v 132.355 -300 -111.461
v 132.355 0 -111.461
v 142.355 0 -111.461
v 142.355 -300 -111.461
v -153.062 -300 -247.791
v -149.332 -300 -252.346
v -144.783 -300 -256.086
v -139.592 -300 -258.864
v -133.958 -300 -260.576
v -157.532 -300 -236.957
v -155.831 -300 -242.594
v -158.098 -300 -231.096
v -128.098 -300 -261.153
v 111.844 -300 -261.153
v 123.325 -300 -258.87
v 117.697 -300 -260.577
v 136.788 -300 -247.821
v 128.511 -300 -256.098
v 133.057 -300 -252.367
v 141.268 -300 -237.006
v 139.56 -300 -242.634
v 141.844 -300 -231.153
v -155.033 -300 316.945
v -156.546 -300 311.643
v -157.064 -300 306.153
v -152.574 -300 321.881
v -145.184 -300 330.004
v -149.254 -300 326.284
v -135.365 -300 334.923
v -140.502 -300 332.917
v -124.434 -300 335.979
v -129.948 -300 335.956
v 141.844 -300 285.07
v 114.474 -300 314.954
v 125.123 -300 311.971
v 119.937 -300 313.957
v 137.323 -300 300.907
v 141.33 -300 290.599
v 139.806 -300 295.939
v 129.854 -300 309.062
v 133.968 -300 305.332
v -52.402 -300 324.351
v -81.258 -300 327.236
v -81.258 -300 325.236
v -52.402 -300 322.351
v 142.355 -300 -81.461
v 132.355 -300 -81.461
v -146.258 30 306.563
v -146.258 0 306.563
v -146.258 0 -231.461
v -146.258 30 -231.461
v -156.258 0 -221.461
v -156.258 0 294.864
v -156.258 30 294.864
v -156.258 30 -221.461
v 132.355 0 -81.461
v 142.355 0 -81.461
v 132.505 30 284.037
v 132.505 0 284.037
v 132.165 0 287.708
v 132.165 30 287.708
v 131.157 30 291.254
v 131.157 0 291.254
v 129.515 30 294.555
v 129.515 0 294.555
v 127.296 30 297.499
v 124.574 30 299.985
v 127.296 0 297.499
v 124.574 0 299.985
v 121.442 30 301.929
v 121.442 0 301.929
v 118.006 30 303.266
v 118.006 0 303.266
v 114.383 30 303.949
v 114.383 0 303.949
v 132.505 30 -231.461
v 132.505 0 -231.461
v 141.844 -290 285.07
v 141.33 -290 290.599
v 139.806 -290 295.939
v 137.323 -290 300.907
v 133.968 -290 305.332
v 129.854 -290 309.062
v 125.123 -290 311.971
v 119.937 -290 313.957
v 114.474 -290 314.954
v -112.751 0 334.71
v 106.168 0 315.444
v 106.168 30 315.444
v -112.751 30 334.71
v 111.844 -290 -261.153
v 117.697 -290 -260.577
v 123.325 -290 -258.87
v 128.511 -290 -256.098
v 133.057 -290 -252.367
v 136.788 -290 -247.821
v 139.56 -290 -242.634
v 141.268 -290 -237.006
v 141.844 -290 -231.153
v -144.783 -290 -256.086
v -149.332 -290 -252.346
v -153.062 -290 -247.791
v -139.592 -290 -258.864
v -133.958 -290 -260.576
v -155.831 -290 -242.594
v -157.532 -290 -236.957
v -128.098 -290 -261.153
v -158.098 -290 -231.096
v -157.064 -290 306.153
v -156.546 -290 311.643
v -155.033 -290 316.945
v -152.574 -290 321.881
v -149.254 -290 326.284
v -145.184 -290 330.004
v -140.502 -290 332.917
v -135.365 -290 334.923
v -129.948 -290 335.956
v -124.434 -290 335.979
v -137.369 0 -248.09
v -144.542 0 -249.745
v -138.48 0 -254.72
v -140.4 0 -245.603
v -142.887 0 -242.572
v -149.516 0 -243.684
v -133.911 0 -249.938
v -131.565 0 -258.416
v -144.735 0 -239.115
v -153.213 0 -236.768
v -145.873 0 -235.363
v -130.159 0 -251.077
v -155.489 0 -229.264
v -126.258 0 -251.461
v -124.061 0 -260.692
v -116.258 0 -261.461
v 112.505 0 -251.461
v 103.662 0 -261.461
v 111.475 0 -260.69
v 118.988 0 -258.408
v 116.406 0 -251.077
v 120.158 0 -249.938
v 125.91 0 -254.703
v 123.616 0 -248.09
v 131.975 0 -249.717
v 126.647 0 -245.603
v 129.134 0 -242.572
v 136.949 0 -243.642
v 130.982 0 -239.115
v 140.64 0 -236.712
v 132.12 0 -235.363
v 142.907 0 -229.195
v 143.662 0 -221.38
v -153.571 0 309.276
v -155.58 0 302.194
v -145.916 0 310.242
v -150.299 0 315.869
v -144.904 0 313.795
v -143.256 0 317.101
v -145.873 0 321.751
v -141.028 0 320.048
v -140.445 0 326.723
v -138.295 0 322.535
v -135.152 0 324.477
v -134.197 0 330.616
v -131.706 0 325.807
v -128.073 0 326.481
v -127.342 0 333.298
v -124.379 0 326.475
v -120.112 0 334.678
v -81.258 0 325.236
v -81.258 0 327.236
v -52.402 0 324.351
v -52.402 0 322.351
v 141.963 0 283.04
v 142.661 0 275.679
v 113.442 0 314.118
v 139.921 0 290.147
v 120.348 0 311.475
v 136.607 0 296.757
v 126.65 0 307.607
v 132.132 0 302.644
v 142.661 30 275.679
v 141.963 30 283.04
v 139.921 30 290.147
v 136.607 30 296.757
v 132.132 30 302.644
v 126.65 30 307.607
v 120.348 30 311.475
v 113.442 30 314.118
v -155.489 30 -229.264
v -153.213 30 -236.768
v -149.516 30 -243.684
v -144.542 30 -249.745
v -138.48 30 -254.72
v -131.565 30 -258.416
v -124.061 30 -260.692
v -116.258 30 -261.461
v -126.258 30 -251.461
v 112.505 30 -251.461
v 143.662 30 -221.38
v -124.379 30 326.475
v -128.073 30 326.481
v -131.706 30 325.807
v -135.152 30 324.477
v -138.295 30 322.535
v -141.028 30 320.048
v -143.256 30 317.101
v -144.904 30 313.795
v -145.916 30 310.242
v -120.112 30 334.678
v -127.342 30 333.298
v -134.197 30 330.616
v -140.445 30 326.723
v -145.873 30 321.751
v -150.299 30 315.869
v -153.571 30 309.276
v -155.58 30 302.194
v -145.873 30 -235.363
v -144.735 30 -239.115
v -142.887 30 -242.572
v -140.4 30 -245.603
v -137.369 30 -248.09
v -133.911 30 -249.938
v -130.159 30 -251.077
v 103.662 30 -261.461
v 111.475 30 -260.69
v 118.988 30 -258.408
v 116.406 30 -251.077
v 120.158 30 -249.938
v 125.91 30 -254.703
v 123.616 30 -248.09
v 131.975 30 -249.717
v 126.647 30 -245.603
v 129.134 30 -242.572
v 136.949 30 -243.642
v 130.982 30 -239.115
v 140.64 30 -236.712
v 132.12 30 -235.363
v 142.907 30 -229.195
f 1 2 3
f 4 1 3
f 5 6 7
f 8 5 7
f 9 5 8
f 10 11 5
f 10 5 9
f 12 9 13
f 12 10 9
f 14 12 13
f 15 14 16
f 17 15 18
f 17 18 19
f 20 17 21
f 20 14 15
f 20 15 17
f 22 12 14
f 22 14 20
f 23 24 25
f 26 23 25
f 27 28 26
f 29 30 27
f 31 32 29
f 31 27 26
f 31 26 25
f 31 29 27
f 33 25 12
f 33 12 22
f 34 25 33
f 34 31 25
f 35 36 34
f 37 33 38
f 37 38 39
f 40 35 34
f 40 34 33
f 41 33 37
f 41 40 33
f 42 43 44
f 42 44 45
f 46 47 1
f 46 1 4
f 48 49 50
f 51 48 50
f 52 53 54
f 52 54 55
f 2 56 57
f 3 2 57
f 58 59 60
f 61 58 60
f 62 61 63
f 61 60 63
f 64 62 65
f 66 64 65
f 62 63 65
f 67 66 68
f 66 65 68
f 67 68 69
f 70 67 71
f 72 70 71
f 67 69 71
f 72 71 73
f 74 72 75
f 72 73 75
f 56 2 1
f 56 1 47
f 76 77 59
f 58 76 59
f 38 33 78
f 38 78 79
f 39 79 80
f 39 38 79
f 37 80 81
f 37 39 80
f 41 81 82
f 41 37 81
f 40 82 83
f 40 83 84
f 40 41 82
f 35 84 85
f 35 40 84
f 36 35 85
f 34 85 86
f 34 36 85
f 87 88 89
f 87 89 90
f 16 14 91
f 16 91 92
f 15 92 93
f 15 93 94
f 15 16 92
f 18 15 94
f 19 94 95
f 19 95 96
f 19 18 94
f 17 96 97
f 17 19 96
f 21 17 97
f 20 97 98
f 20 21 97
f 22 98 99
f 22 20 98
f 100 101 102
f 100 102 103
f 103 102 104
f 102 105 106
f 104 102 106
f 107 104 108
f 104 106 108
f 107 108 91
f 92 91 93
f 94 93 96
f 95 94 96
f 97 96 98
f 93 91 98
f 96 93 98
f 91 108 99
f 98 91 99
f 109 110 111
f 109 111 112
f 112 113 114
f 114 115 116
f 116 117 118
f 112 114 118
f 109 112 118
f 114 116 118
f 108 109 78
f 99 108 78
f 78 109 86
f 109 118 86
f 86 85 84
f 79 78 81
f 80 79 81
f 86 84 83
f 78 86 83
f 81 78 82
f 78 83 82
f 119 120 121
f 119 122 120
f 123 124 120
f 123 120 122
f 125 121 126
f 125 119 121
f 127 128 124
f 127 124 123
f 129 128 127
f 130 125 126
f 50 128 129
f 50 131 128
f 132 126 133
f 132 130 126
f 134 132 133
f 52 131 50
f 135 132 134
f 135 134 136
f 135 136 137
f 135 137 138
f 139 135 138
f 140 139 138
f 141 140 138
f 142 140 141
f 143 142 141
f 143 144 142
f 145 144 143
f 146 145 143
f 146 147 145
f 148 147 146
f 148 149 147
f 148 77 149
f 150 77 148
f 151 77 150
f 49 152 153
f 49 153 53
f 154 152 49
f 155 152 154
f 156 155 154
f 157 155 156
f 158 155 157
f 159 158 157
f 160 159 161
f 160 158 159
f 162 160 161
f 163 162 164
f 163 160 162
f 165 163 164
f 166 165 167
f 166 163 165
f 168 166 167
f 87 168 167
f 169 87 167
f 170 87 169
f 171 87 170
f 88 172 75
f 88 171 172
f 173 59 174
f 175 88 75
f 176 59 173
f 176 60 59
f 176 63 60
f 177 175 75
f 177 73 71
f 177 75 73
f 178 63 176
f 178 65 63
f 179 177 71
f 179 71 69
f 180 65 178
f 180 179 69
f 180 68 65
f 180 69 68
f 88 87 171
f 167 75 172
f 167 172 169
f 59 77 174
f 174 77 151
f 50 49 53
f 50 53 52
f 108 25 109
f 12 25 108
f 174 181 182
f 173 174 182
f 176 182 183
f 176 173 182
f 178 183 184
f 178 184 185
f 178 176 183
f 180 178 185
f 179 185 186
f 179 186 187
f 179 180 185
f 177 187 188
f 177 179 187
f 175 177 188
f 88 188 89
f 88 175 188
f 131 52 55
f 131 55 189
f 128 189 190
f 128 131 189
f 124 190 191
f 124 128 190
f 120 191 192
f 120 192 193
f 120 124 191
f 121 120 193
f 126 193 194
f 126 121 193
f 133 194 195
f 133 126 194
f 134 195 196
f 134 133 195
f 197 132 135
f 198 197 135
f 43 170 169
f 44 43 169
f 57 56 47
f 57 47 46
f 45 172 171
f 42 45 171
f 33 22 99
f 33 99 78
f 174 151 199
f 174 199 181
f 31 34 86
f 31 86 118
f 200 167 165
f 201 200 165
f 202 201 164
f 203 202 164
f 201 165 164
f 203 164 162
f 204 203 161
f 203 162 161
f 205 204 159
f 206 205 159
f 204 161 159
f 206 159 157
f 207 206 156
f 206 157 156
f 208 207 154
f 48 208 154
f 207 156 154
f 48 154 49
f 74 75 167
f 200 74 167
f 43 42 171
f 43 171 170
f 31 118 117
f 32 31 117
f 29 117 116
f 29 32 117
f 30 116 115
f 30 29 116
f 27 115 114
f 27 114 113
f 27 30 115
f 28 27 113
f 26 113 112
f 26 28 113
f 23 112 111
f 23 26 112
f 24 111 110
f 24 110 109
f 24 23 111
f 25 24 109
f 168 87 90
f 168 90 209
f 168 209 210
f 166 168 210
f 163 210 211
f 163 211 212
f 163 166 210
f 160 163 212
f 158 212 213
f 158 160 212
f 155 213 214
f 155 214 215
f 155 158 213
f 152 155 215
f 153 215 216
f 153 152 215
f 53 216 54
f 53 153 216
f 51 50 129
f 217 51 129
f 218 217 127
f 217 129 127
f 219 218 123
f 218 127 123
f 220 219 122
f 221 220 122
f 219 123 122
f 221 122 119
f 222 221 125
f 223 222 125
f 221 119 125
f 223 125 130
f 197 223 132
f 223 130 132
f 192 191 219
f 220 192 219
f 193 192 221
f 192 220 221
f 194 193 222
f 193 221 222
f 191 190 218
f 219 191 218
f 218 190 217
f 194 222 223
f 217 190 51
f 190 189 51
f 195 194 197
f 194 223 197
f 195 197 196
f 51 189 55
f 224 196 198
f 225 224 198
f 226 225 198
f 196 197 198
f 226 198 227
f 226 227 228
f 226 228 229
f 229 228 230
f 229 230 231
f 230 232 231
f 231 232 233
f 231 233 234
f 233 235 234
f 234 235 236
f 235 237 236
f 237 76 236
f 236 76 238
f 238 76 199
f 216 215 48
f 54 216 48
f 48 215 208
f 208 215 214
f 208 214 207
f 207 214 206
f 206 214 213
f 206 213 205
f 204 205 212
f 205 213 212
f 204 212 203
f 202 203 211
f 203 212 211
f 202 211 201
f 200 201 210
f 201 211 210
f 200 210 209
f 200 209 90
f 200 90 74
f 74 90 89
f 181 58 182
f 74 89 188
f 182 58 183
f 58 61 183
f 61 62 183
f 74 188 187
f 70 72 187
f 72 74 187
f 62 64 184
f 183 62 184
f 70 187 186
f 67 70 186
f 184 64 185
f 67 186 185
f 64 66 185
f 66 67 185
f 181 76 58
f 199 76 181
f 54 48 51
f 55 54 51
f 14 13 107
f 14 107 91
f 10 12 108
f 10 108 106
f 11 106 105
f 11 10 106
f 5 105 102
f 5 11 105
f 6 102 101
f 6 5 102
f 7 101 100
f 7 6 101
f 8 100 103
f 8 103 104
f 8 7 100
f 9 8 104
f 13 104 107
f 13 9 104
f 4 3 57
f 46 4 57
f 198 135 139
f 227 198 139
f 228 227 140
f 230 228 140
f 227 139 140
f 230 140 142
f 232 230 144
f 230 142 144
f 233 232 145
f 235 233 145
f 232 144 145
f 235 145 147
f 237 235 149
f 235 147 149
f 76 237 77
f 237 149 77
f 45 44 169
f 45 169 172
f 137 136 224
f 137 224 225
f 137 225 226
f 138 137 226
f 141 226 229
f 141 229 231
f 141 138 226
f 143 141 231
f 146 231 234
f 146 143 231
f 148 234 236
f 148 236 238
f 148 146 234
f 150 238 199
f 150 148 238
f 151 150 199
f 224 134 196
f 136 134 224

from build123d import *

# Parameters (mm, degrees)
F1_DEPTH = 30
F3_DEPTH = 30
F4_W     = 10
F4_H     = 30
F5_DEPTH = 300
F7_DEPTH = 300
F9_DEPTH = 10


with BuildPart() as f1:
    # F0 (on Front) → F1 (new body)
    with BuildSketch(Plane.XZ):
        with BuildLine():
            ThreePointArc((-112.750921, 334.7103), (-143.273633, 324.362328), (-156.257588, 294.864305))
            Line((-156.257588, 294.864305), (-156.257588, -221.460874))
            ThreePointArc((-156.257588, -221.460874), (-144.541859, -249.745146), (-116.257588, -261.460874))
            Line((-116.257588, -261.460874), (103.661798, -261.460874))
            ThreePointArc((103.661798, -261.460874), (131.974528, -249.716659), (143.661717, -221.380342))
            Line((143.661717, -221.380342), (142.660979, 275.678792))
            ThreePointArc((142.660979, 275.678792), (132.131872, 302.643985), (106.167727, 315.444255))
            Line((106.167727, 315.444255), (-112.750921, 334.7103))
        make_face()
    extrude(amount=-F1_DEPTH)

    # F2 (on face) → F3 (cut)
    with BuildSketch(Plane.XZ):
        with BuildLine():
            ThreePointArc((-124.379017, 326.474977), (-139.719174, 321.354805), (-146.257588, 306.563398))
            Line((-146.257588, 306.563398), (-146.257588, -231.460874))
            ThreePointArc((-146.257588, -231.460874), (-140.399724, -245.60301), (-126.257588, -251.460874))
            Line((-126.257588, -251.460874), (112.504515, -251.460874))
            ThreePointArc((112.504515, -251.460874), (126.64665, -245.60301), (132.504515, -231.460874))
            Line((132.504515, -231.460874), (132.504515, 284.037225))
            ThreePointArc((132.504515, 284.037225), (127.295922, 297.498811), (114.383086, 303.948804))
            Line((114.383086, 303.948804), (-124.379017, 326.474977))
        make_face()
    extrude(amount=-F3_DEPTH, mode=Mode.SUBTRACT)

    # F6 (on Front) → F7 (join)
    with BuildSketch(Plane.XZ):
        Polygon((-52.401509, 324.350622), (-81.257588, 327.236228), (-81.257588, 325.236228), (-52.401509, 322.350622), align=None)
    extrude(amount=F7_DEPTH)


with BuildPart() as f5:
    # F4 (on Front) → F5 (new body)
    with BuildSketch(Plane.XZ):
        with Locations((137.355371, -96.460874)):
            Rectangle(F4_W, F4_H)
    extrude(amount=F5_DEPTH)


with BuildPart() as f9:
    # F8 (on face) → F9 (new body)
    with BuildSketch(Plane.XZ.offset(300)):
        with BuildLine():
            ThreePointArc((-158.098102, -231.095712), (-149.33177, -252.34624), (-128.098158, -261.153464))
            Line((-128.098158, -261.153464), (111.844035, -261.153464))
            ThreePointArc((111.844035, -261.153464), (133.057238, -252.366668), (141.844035, -231.153464))
            Line((141.844035, -231.153464), (141.844035, 285.069638))
            ThreePointArc((141.844035, 285.069638), (133.967552, 305.331672), (114.474035, 314.954134))
            Line((114.474035, 314.954134), (-124.433917, 335.979348))
            ThreePointArc((-124.433917, 335.979348), (-147.304646, 328.237862), (-157.063861, 306.152604))
            Line((-157.063861, 306.152604), (-158.098102, -231.095712))
        make_face()
    extrude(amount=-F9_DEPTH)


solid = Compound([f1.part, f5.part, f9.part])
